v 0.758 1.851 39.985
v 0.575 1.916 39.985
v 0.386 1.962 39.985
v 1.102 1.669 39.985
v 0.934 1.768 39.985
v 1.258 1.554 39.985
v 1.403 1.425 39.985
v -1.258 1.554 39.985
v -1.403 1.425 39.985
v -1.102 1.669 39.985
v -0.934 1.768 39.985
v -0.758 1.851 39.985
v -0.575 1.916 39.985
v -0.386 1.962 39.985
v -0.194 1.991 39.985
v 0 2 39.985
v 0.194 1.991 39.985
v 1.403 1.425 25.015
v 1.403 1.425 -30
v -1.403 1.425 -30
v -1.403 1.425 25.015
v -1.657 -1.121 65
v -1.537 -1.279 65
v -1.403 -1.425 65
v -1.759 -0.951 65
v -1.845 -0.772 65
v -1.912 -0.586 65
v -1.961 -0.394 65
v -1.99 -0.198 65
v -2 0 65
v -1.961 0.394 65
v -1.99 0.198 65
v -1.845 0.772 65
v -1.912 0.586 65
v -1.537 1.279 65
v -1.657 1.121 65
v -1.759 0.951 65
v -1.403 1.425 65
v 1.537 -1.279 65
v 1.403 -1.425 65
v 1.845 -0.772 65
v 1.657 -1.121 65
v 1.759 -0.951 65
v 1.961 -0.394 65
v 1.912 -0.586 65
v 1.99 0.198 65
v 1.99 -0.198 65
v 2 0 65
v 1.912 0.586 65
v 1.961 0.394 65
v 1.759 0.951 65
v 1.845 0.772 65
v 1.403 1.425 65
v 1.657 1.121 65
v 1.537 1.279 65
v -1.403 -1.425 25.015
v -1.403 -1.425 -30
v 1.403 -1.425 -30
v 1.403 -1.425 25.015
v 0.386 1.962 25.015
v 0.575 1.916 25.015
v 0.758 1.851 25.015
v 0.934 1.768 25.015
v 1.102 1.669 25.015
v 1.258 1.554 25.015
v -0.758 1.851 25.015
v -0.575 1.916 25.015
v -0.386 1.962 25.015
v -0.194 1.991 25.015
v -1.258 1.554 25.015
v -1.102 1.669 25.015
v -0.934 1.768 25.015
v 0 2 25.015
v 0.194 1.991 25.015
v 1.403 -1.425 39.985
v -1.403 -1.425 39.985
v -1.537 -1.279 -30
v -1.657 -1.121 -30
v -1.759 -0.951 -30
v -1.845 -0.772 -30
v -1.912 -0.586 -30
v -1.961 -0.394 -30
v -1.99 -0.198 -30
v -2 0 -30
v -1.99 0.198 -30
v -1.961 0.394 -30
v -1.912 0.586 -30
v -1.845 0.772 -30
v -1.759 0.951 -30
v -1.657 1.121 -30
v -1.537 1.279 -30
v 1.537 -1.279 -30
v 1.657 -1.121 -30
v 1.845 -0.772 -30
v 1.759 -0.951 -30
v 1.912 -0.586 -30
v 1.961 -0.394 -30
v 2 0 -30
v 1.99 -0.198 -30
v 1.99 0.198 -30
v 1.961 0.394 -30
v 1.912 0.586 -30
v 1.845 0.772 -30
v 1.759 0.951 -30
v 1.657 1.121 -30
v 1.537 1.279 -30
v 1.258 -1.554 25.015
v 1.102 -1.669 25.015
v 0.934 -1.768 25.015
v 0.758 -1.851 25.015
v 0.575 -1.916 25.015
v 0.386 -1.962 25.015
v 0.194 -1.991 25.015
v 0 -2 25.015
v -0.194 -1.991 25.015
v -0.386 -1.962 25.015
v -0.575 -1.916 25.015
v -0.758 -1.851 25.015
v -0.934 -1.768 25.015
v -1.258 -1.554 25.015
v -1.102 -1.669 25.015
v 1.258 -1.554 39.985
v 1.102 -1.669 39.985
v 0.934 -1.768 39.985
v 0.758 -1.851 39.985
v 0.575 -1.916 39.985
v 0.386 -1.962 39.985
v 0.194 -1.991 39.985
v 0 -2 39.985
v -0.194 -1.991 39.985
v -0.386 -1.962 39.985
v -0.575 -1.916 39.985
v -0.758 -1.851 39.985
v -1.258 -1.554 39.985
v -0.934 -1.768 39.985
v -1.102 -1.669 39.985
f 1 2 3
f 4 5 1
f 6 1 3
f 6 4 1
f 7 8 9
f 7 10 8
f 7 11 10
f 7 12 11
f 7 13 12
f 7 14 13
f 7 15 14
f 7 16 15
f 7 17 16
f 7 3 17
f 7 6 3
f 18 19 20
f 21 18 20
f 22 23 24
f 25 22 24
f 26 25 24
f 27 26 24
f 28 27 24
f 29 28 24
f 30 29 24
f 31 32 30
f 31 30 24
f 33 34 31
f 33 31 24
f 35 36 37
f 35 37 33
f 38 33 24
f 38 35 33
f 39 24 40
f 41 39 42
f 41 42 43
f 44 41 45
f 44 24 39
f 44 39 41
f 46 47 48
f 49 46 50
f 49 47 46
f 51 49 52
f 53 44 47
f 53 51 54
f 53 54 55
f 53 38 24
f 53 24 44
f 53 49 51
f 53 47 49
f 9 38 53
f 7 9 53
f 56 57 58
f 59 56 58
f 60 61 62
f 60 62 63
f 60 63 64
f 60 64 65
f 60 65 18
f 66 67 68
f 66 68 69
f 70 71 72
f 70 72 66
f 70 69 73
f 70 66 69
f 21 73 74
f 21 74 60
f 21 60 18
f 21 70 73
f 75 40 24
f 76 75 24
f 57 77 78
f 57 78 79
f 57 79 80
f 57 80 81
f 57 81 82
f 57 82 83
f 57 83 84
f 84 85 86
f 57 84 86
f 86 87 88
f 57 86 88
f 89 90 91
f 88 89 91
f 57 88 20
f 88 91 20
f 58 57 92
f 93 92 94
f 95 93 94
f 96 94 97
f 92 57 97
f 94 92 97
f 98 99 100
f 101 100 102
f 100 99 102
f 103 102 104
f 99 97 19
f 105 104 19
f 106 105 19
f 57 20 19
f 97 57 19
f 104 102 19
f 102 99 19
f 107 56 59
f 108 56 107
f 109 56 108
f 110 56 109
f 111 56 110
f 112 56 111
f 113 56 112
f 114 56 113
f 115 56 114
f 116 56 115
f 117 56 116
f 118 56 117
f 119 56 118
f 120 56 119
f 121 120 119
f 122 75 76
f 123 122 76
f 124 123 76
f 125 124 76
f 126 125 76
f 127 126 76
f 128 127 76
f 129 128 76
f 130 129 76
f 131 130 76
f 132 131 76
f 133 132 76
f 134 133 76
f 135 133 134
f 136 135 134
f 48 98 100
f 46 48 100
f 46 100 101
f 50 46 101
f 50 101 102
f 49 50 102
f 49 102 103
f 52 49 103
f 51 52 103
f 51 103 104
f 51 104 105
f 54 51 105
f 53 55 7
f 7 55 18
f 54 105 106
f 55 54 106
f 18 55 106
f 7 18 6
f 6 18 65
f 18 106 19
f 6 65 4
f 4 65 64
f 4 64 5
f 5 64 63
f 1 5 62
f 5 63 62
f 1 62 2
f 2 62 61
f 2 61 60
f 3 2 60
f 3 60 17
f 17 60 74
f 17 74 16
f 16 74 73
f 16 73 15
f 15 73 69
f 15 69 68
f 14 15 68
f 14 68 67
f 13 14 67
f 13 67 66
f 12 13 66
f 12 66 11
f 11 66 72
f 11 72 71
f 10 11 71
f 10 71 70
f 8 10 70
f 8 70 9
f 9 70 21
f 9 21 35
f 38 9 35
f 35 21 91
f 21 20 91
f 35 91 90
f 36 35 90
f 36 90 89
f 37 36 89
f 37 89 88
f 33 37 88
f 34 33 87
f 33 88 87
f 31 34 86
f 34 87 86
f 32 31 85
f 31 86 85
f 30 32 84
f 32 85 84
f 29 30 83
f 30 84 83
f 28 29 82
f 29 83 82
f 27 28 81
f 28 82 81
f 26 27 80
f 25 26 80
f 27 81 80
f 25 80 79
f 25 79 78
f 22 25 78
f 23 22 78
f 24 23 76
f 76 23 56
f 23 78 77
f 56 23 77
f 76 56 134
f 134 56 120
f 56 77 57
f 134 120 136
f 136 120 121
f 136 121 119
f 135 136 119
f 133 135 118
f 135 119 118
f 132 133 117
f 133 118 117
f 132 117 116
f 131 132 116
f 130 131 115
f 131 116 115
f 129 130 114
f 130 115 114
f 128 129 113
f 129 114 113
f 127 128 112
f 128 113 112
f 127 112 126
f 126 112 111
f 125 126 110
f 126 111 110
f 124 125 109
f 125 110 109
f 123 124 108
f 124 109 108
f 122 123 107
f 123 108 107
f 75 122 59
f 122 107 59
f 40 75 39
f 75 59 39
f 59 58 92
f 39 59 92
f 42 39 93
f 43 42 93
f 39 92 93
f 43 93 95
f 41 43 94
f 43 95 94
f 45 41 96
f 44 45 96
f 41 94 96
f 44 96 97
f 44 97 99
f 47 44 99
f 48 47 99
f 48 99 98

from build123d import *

# Parameters (mm, degrees)
RESSALTO_EXTRUS_O1_DEPTH      = 65
RESSALTO_EXTRUS_O1_DEPTH_BACK = 30
ESBO_O1_R                     = 2
CORTE_EXTRUS_O4_DEPTH         = 25.015
CORTE_EXTRUS_O5_DEPTH         = 55.015


with BuildPart() as part:
    # Esboço1 → Ressalto-extrusão1 (new, two sides: drawn at the far end of the back side and taken through both)
    with BuildSketch(Plane.XY.offset(-RESSALTO_EXTRUS_O1_DEPTH_BACK)):
        Circle(ESBO_O1_R)
    extrude(amount=RESSALTO_EXTRUS_O1_DEPTH + RESSALTO_EXTRUS_O1_DEPTH_BACK)

    # Esboço5 → Corte-extrusão4 (cut)
    with BuildSketch(Plane.XY.offset(65)):
        Polygon((0, 1.425), (2.691542187, 1.425), (2.691542187, 2.754428638), (-3.67257147, 2.754428638), (-3.67257147, 1.425), align=None)
        Polygon((0, -1.425), (2.691542187, -1.425), (2.691542187, -2.855047036), (-3.67257147, -2.855047036), (-3.67257147, -1.425), align=None)
    extrude(amount=-CORTE_EXTRUS_O4_DEPTH, mode=Mode.SUBTRACT)

    # Esboço6 → Corte-extrusão5 (cut)
    with BuildSketch(Plane(origin=(0, 0, -30), x_dir=(-1, 0, 0), z_dir=(0, 0, -1))):
        Polygon((0, 1.425), (2.641232941, 1.425), (2.641232941, 2.588827525), (-2.871816769, 2.588827525), (-2.871816769, 1.425), align=None)
        Polygon((0, -1.425), (2.641232941, -1.425), (2.641232941, -2.693638356), (-2.871816769, -2.693638356), (-2.871816769, -1.425), align=None)
    extrude(amount=-CORTE_EXTRUS_O5_DEPTH, mode=Mode.SUBTRACT)


solid = part.part
